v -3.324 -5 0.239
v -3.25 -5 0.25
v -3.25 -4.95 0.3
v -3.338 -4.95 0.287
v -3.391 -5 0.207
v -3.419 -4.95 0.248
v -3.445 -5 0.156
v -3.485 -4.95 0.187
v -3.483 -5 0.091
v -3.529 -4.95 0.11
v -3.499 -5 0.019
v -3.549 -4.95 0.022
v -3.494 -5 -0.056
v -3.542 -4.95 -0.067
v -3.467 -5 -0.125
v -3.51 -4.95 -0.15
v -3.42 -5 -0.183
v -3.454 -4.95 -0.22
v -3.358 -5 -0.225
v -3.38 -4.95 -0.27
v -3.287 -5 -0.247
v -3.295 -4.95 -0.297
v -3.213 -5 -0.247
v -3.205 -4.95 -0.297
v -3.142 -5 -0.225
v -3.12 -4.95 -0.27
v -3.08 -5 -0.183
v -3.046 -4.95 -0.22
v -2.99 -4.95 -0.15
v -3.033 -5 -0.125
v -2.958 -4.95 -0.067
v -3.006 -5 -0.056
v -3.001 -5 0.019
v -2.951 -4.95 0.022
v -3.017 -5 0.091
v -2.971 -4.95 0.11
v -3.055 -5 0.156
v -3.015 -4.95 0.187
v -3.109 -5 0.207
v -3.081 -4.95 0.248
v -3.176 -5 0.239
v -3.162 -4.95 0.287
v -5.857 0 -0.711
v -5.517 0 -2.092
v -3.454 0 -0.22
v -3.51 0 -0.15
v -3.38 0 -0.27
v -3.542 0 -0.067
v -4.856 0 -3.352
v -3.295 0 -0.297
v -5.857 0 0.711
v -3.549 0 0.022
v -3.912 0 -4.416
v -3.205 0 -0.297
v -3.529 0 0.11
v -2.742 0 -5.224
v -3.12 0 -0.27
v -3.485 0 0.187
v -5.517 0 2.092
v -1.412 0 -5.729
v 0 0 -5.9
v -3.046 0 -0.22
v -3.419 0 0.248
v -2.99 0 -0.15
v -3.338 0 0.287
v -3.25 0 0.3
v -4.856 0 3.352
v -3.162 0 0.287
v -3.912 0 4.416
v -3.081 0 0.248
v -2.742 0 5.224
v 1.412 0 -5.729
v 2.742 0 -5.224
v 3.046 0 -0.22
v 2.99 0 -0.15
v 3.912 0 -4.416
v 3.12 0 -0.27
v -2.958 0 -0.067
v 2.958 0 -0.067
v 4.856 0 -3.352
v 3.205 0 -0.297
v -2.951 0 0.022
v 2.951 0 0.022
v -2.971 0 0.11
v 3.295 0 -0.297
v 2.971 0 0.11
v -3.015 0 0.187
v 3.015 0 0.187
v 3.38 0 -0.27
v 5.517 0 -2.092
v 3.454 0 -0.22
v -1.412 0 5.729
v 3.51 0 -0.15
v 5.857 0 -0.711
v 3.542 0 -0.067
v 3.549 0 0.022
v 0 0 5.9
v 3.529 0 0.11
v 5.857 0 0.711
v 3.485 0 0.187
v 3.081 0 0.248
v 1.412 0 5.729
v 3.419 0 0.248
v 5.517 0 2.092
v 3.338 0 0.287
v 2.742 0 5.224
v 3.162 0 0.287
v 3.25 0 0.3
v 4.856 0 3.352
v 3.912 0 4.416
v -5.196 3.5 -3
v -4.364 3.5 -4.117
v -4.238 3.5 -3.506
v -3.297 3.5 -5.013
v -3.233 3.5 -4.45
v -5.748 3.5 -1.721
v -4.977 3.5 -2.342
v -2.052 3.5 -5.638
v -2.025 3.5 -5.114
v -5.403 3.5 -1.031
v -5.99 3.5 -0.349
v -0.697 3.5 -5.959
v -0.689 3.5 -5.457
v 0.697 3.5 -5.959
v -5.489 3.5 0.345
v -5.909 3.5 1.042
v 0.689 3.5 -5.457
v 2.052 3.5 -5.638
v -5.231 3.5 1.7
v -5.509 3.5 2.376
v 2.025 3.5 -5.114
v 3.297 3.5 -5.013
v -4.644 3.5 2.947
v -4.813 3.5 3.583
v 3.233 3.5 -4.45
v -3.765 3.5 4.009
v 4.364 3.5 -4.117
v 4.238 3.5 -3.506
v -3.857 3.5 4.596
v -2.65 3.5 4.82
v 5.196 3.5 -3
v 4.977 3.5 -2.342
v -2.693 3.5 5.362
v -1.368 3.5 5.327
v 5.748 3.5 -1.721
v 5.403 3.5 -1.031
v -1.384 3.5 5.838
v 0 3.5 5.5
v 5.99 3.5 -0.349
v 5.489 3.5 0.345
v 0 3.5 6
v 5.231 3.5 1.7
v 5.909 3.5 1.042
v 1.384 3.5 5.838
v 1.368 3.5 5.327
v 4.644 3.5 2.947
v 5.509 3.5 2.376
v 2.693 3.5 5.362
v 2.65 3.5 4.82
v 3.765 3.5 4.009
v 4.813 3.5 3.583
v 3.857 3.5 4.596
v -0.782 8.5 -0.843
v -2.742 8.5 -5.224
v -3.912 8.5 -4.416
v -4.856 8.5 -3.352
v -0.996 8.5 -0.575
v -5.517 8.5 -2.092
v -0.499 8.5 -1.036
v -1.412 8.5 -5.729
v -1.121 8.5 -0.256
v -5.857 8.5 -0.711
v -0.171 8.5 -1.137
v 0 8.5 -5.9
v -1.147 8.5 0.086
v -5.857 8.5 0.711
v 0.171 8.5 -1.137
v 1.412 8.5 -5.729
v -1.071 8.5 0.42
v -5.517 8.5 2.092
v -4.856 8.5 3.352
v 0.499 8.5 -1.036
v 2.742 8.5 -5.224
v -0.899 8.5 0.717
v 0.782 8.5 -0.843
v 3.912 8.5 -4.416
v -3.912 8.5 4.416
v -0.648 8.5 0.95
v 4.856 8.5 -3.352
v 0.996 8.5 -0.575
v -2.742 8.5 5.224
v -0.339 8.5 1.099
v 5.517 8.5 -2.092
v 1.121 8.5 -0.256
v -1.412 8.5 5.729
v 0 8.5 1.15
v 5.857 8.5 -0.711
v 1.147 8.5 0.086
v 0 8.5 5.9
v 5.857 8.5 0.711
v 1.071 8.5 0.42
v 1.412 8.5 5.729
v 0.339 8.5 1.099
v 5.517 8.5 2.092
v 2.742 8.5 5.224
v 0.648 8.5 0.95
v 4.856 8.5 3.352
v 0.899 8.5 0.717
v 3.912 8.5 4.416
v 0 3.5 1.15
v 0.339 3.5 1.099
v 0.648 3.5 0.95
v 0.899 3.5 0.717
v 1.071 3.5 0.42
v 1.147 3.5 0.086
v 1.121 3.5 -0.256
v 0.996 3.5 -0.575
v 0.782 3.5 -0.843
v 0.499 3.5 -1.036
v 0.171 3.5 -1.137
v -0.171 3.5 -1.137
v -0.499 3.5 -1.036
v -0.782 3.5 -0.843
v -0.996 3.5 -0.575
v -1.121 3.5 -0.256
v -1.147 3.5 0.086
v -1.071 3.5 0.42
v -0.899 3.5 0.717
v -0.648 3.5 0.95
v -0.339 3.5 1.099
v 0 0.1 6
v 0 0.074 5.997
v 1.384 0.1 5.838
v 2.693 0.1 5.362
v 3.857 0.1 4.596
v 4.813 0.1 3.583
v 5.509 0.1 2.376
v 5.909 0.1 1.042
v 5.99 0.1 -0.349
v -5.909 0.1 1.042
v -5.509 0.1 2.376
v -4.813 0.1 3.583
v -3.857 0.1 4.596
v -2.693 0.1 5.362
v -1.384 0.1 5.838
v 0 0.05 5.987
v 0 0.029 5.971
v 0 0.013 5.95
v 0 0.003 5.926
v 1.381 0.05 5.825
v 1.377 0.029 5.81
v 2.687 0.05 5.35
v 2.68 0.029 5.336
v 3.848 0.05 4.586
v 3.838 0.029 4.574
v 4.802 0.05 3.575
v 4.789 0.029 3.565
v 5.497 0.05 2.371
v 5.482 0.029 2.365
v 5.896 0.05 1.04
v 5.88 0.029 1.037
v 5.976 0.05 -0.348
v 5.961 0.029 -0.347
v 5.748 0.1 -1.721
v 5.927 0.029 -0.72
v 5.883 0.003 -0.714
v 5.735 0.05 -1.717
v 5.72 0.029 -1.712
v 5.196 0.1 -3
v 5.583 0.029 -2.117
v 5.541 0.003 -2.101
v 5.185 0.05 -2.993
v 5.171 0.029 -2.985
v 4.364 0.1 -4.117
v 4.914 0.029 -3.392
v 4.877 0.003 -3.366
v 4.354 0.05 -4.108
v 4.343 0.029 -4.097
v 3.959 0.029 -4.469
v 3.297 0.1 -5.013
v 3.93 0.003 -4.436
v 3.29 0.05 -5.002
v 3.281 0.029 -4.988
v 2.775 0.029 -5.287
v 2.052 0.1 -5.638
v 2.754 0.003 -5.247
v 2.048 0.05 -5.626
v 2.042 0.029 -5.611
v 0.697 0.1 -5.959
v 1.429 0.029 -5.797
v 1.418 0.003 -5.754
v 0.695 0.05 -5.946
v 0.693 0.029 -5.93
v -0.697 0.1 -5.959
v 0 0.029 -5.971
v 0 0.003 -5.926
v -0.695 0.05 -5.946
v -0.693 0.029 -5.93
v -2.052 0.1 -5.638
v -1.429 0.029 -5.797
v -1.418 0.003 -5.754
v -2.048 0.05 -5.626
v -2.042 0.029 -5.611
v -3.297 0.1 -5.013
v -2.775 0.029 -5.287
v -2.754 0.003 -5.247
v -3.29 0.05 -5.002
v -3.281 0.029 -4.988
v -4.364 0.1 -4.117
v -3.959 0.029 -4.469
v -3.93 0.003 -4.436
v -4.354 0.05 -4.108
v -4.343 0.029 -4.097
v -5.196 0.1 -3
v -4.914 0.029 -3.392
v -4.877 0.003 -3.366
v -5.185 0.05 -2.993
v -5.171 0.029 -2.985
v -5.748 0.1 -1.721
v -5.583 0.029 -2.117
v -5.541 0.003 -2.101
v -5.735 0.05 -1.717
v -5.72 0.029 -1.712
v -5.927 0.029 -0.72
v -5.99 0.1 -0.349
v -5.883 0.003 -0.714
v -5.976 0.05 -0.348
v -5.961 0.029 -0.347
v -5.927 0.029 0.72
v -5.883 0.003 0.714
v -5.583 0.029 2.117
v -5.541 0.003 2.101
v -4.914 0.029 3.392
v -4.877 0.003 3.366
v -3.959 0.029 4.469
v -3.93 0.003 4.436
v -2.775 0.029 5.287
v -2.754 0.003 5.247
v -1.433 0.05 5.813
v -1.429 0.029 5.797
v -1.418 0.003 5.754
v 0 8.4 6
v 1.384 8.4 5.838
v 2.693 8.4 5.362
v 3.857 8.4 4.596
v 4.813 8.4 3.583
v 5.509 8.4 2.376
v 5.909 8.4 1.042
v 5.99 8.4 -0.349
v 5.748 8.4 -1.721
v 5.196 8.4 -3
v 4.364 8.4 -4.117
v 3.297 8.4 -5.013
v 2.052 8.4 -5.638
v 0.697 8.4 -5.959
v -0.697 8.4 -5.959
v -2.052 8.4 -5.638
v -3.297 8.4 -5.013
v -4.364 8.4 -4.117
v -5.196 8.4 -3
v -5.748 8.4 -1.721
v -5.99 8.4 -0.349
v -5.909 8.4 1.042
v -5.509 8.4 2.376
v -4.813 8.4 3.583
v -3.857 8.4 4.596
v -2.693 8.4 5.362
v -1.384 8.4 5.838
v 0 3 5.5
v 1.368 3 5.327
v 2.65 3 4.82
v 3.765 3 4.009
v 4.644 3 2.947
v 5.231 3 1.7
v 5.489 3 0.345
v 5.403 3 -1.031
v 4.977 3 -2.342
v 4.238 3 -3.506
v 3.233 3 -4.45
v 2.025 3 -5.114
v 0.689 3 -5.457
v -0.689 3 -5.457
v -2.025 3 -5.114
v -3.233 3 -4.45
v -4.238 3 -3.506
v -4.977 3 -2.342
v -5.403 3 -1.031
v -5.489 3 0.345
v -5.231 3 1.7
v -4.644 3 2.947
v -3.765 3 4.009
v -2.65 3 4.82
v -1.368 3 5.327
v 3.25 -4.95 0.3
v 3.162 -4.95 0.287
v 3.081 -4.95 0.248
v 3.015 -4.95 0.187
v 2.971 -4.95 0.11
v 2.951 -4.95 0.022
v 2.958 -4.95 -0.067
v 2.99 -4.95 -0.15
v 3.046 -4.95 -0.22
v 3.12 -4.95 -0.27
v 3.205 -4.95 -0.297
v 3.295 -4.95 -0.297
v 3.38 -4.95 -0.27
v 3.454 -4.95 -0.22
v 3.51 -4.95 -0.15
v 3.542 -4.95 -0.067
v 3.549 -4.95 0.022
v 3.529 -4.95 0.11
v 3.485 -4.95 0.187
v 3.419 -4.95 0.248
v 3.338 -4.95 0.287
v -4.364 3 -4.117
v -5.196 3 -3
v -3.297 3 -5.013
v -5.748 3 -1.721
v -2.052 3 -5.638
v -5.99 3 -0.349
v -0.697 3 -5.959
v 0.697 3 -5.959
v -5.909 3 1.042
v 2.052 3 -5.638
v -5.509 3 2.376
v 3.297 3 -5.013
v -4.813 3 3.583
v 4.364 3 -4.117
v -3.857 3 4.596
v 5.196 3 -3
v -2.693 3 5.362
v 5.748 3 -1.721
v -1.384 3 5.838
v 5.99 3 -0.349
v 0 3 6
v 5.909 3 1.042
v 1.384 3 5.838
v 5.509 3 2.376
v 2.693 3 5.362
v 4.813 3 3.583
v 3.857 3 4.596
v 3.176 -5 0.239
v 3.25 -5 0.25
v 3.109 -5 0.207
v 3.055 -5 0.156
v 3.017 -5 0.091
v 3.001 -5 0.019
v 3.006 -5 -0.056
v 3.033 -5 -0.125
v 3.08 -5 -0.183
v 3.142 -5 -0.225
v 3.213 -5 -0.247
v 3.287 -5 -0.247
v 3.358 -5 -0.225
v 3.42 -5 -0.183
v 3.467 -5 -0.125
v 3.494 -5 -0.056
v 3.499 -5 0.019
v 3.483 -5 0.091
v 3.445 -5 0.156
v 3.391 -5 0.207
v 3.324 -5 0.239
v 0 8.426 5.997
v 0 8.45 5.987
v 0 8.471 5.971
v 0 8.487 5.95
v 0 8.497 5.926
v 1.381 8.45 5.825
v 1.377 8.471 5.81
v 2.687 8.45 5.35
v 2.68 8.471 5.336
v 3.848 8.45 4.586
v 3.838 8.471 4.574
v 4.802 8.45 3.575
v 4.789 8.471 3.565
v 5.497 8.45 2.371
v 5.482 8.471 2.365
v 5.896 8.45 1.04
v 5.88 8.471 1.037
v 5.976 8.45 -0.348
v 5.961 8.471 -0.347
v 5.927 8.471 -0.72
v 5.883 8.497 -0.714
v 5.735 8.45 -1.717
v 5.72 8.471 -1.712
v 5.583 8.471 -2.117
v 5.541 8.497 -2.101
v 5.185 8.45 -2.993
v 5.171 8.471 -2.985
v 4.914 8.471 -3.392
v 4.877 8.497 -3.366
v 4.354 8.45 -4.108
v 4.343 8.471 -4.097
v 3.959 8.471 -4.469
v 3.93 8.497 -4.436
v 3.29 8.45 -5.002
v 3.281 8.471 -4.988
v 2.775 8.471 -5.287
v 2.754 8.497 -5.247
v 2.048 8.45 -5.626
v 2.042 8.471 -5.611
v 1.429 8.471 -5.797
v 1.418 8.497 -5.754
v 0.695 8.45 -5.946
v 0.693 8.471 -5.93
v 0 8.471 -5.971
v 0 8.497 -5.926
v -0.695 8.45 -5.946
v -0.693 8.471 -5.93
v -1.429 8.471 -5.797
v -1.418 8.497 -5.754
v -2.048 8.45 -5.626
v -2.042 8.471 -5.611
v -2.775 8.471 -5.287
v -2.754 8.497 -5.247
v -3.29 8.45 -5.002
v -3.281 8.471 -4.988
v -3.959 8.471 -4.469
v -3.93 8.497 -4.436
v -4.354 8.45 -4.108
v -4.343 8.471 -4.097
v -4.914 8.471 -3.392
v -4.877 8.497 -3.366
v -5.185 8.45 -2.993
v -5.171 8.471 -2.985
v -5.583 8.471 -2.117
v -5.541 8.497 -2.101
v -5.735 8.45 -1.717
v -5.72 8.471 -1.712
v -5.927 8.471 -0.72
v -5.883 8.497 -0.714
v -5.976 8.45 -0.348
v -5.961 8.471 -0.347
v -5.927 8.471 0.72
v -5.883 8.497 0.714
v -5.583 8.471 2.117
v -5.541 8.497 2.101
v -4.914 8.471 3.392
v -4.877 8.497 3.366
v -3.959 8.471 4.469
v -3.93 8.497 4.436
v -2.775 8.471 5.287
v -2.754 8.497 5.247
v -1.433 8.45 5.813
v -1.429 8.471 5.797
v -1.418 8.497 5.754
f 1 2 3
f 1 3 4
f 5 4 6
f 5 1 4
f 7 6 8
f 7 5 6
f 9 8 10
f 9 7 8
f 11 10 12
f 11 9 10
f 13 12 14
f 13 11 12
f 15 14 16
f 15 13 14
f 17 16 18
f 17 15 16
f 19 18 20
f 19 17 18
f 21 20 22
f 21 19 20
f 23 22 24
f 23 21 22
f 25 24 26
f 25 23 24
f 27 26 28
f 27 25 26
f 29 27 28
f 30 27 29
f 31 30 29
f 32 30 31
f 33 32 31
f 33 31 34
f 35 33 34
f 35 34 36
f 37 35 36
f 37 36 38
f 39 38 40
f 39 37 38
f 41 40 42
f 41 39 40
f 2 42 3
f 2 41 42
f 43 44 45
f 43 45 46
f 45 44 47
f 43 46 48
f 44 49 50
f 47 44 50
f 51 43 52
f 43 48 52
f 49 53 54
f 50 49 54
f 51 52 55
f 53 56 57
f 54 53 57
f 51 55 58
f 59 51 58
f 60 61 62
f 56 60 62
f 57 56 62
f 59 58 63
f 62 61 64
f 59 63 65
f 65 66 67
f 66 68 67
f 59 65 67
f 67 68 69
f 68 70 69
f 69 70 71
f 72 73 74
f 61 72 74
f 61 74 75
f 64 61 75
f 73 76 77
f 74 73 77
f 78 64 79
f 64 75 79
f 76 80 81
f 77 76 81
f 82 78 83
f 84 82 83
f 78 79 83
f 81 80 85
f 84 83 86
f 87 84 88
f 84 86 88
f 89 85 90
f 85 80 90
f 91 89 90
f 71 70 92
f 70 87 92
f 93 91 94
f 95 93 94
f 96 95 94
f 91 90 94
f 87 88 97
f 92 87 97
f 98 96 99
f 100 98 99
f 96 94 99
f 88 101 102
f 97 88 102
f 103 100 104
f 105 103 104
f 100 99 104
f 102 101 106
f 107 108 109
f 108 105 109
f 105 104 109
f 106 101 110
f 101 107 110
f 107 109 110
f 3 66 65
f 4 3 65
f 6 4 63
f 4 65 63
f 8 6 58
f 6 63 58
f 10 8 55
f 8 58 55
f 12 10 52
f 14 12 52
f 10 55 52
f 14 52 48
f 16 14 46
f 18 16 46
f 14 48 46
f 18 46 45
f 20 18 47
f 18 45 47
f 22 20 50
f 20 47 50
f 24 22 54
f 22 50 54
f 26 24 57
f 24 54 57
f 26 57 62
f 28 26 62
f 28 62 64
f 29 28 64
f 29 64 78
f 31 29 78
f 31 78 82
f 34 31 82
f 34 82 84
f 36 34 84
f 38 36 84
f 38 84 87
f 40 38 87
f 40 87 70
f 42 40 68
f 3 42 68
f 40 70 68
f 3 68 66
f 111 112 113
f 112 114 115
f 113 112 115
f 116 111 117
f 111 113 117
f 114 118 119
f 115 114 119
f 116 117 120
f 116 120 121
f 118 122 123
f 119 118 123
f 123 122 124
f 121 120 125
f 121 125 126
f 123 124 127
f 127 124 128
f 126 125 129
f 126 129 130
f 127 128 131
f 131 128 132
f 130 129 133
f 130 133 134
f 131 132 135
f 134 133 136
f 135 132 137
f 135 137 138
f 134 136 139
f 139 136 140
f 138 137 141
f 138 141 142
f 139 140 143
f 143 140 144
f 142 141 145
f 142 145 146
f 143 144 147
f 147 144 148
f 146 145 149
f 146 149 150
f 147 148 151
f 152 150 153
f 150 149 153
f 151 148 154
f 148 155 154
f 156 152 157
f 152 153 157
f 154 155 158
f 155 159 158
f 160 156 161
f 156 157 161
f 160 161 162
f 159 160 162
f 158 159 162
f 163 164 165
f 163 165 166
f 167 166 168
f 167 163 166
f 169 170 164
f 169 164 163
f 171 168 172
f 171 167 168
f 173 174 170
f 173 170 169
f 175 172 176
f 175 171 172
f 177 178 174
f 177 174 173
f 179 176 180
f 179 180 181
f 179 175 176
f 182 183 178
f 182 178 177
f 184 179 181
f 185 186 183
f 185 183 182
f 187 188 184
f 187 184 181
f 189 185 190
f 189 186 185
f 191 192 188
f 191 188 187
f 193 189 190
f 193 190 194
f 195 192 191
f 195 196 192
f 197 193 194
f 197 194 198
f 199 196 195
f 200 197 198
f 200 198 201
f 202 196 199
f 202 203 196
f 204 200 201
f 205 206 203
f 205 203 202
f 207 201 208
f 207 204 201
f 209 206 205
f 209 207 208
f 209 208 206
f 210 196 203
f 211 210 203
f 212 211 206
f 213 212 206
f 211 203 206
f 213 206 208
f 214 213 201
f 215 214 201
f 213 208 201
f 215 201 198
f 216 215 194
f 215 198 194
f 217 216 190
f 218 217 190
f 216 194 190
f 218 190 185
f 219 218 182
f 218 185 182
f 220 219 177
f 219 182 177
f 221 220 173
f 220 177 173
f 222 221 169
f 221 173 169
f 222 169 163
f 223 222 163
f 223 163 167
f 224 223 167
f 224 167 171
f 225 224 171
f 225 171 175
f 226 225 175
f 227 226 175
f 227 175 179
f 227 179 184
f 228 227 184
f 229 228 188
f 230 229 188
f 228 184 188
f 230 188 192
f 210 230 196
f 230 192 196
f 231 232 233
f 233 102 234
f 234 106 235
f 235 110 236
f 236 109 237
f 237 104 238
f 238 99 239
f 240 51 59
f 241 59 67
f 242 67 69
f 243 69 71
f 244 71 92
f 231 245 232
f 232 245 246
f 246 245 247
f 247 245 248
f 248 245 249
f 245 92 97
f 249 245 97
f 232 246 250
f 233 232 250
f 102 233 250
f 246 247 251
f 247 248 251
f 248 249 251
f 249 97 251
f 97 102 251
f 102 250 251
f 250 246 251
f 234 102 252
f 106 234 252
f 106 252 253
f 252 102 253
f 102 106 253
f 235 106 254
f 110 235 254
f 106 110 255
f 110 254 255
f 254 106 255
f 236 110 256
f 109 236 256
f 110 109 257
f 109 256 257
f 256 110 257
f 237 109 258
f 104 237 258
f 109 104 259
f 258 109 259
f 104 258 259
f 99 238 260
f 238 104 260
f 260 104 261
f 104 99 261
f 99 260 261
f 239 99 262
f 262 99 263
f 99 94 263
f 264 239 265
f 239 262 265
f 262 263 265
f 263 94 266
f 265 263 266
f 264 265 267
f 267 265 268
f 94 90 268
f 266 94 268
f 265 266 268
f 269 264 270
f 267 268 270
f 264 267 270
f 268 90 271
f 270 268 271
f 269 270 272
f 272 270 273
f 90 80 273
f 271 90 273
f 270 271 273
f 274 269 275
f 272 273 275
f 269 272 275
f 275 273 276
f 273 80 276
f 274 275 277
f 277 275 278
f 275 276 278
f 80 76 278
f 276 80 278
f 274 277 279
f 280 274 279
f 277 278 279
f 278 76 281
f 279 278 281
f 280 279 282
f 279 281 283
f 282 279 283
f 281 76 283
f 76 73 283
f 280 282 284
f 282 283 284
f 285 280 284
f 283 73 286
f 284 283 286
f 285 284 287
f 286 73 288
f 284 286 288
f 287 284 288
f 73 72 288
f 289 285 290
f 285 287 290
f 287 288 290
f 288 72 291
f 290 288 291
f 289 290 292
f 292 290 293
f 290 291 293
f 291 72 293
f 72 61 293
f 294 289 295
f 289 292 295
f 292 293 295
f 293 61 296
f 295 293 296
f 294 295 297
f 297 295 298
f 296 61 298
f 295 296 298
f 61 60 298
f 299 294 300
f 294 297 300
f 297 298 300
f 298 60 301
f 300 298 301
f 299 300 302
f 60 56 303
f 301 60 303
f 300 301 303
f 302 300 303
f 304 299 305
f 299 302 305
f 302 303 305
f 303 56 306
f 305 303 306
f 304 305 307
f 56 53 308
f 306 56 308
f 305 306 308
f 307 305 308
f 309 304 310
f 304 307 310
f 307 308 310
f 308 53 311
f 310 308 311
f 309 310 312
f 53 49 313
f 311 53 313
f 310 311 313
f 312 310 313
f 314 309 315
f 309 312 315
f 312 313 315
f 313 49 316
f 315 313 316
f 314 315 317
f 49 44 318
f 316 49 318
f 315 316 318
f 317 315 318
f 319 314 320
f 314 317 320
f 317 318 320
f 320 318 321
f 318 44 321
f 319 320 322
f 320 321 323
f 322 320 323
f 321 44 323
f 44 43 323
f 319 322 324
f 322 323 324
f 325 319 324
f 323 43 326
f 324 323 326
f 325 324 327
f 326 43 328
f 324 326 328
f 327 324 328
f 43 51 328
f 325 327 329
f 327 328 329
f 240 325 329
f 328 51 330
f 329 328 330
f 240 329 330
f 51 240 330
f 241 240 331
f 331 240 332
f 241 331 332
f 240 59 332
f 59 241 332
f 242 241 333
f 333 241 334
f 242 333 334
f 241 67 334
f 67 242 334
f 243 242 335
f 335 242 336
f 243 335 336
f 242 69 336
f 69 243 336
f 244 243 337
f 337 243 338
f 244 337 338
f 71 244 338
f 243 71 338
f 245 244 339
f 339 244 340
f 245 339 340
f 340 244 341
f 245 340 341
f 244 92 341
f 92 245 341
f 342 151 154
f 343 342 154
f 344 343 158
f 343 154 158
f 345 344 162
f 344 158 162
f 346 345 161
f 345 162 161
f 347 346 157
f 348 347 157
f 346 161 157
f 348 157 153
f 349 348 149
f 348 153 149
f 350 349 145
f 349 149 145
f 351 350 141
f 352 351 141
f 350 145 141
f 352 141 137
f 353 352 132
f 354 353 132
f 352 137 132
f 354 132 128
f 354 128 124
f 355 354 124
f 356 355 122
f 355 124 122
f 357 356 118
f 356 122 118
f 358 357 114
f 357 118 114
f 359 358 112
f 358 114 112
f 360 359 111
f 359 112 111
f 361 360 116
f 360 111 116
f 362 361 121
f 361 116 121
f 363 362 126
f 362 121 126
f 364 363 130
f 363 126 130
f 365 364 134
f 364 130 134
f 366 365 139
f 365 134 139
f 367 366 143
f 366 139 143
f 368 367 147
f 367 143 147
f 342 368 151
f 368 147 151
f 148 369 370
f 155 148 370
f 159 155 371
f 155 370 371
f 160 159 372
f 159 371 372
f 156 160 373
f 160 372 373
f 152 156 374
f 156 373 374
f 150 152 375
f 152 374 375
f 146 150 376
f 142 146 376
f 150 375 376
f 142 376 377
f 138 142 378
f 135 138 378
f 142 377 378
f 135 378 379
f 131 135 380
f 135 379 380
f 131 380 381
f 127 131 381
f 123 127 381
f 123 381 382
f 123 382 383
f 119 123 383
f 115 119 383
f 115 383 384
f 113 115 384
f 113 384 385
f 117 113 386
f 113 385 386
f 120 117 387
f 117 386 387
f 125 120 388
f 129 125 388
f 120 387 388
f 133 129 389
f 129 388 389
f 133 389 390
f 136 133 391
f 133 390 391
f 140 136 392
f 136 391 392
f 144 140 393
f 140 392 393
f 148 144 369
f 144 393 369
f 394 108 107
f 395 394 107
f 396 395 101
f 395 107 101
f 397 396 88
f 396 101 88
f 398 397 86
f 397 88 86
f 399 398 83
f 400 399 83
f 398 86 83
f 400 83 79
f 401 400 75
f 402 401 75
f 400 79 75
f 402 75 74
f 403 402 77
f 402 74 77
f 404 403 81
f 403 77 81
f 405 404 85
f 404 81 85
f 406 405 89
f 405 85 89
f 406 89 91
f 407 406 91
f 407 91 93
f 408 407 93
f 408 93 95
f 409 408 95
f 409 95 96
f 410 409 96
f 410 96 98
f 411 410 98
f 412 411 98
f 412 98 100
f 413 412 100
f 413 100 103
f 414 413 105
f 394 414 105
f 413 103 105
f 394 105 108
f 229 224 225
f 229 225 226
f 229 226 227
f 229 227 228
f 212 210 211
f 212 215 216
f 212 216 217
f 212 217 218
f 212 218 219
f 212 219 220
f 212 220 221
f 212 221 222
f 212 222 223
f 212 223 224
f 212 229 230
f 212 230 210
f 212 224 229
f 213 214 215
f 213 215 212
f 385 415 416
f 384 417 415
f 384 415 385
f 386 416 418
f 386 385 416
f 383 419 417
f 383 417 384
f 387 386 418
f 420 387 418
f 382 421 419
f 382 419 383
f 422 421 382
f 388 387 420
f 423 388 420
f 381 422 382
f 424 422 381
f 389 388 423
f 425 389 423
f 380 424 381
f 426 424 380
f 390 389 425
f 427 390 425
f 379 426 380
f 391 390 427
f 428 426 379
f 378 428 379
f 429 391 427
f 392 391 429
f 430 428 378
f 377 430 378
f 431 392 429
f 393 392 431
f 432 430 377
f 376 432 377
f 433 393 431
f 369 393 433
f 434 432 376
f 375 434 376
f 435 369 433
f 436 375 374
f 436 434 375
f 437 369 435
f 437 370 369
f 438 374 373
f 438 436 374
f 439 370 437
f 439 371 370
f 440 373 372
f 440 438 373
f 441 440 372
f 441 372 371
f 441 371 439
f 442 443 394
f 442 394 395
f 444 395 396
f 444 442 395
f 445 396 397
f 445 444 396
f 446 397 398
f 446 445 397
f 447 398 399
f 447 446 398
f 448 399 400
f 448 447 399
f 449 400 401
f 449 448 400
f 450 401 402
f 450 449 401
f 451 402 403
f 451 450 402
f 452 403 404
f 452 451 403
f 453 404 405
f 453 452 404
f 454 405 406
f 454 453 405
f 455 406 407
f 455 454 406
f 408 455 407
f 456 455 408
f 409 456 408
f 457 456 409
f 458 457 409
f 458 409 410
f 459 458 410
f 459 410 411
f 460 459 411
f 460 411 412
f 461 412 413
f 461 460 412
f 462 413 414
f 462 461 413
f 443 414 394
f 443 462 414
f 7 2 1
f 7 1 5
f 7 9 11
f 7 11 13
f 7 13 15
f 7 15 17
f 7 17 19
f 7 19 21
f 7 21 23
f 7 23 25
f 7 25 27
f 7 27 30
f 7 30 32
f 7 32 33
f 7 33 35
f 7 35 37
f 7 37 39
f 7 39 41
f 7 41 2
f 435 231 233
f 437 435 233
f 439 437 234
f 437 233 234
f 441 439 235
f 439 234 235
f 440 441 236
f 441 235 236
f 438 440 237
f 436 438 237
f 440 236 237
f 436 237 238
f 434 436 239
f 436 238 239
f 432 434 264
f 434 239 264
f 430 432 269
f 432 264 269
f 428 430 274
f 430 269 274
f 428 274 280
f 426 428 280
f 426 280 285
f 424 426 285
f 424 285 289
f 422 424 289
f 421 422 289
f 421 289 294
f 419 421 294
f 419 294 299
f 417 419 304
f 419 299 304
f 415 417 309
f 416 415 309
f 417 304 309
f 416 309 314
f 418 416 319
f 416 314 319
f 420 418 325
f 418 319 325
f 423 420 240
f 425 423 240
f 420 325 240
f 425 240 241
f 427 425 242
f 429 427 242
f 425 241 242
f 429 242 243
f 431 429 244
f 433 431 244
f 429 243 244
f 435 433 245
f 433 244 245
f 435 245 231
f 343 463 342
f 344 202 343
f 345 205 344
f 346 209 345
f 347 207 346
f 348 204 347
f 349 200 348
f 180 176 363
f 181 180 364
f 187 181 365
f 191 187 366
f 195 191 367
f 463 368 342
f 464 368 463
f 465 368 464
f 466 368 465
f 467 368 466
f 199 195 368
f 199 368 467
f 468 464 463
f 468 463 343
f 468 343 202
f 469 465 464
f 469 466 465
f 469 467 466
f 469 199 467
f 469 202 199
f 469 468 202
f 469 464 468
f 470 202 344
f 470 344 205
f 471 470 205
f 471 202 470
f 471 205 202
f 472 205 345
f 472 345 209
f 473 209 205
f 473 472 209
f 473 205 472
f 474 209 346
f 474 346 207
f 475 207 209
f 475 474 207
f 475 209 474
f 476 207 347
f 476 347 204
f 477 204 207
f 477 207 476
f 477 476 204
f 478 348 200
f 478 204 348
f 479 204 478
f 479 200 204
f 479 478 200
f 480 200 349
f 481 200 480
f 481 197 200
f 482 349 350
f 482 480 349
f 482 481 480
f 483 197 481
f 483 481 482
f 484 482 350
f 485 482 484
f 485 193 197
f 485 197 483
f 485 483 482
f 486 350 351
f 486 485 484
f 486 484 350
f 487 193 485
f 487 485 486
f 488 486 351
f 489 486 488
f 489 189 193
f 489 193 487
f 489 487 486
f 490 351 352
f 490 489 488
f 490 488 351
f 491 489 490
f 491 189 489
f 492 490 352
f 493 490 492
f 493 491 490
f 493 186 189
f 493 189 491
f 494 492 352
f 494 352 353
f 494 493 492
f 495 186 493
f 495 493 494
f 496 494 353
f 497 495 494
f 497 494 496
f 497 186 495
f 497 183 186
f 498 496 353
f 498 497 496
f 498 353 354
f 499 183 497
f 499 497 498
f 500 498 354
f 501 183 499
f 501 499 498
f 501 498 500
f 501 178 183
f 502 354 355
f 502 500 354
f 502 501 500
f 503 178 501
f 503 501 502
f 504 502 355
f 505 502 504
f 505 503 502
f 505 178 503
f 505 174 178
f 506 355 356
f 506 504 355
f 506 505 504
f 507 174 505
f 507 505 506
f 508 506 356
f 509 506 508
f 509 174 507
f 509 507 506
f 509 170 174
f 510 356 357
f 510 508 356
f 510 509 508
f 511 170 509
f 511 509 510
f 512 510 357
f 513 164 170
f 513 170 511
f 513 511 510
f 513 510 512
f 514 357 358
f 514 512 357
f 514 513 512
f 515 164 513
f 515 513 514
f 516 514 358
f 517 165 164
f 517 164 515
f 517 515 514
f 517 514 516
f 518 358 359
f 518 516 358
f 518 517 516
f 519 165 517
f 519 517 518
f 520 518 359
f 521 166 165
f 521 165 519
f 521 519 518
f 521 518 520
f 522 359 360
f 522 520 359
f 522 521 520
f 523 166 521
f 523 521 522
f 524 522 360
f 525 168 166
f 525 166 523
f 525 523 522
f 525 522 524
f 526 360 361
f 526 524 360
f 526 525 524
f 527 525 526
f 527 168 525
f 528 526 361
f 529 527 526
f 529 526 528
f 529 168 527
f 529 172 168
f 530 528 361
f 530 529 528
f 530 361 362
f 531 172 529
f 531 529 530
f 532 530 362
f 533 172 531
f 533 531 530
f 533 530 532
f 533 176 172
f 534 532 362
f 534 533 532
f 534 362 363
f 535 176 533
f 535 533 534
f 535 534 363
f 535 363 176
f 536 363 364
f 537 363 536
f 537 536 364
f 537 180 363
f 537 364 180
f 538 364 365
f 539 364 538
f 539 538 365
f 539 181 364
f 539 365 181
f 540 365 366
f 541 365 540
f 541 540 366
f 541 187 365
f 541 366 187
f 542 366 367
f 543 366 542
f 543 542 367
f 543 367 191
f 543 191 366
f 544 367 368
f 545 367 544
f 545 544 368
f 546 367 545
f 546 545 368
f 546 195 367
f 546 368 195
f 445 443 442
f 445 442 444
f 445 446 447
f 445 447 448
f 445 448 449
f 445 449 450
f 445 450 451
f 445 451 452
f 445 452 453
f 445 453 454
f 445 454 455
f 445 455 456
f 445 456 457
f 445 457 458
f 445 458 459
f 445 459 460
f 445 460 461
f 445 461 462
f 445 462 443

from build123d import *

# Parameters (mm, degrees)
SKETCH1_R           = 6
BOSS_EXTRUDE1_DEPTH = 3
SKETCH2_R           = 5.5
BOSS_EXTRUDE2_DEPTH = 0.5
SKETCH3_R           = 6
BOSS_EXTRUDE3_DEPTH = 5
SKETCH4_R           = 1.15
CUT_EXTRUDE1_DEPTH  = 5
SKETCH5_R           = 0.3
BOSS_EXTRUDE4_DEPTH = 5
FILLET1_R           = 0.1
CHAMFER1_SIZE       = 0.05


with BuildPart() as part:
    # Sketch1 → Boss-Extrude1 (new body)
    with BuildSketch(Plane(origin=(0, 0, 0), x_dir=(1, 0, 0), z_dir=(0, 1, 0))):
        with Locations(Location((0, 0, 0), (0, 0, 270))):
            Circle(SKETCH1_R)
    extrude(amount=BOSS_EXTRUDE1_DEPTH)

    # Sketch2 → Boss-Extrude2 (add)
    with BuildSketch(Plane(origin=(0, 3, 0), x_dir=(1, 0, 0), z_dir=(0, 1, 0))):
        with Locations(Location((0, 0, 0), (0, 0, 270))):
            Circle(SKETCH2_R)
    extrude(amount=BOSS_EXTRUDE2_DEPTH)

    # Sketch3 → Boss-Extrude3 (add)
    with BuildSketch(Plane(origin=(0, 3.5, 0), x_dir=(1, 0, 0), z_dir=(0, 1, 0))):
        with Locations(Location((0, 0, 0), (0, 0, 270))):
            Circle(SKETCH3_R)
    extrude(amount=BOSS_EXTRUDE3_DEPTH)

    # Sketch4 → Cut-Extrude1 (cut)
    with BuildSketch(Plane(origin=(0, 8.5, 0), x_dir=(1, 0, 0), z_dir=(0, 1, 0))):
        with Locations(Location((0, 0, 0), (0, 0, 270))):
            Circle(SKETCH4_R)
    extrude(amount=-CUT_EXTRUDE1_DEPTH, mode=Mode.SUBTRACT)

    # Sketch5 → Boss-Extrude4 (add)
    with BuildSketch(Plane.XZ):
        with Locations(Location((-3.25, 0, 0), (0, 0, 90))):
            Circle(SKETCH5_R)
        with Locations(Location((3.25, 0, 0), (0, 0, 90))):
            Circle(SKETCH5_R)
    extrude(amount=BOSS_EXTRUDE4_DEPTH)

    # Fillet1
    fillet1_edges = [part.edges().sort_by_distance(p)[0] for p in [
        (0, 8.5, -6),
        (0, 0, -6),
    ]]
    fillet(fillet1_edges, radius=FILLET1_R)

    # Chamfer1
    chamfer1_edges = [part.edges().sort_by_distance(p)[0] for p in [
        (-3.25, -5, -0.3),
        (3.25, -5, -0.3),
    ]]
    chamfer(chamfer1_edges, length=CHAMFER1_SIZE)


solid = part.part
